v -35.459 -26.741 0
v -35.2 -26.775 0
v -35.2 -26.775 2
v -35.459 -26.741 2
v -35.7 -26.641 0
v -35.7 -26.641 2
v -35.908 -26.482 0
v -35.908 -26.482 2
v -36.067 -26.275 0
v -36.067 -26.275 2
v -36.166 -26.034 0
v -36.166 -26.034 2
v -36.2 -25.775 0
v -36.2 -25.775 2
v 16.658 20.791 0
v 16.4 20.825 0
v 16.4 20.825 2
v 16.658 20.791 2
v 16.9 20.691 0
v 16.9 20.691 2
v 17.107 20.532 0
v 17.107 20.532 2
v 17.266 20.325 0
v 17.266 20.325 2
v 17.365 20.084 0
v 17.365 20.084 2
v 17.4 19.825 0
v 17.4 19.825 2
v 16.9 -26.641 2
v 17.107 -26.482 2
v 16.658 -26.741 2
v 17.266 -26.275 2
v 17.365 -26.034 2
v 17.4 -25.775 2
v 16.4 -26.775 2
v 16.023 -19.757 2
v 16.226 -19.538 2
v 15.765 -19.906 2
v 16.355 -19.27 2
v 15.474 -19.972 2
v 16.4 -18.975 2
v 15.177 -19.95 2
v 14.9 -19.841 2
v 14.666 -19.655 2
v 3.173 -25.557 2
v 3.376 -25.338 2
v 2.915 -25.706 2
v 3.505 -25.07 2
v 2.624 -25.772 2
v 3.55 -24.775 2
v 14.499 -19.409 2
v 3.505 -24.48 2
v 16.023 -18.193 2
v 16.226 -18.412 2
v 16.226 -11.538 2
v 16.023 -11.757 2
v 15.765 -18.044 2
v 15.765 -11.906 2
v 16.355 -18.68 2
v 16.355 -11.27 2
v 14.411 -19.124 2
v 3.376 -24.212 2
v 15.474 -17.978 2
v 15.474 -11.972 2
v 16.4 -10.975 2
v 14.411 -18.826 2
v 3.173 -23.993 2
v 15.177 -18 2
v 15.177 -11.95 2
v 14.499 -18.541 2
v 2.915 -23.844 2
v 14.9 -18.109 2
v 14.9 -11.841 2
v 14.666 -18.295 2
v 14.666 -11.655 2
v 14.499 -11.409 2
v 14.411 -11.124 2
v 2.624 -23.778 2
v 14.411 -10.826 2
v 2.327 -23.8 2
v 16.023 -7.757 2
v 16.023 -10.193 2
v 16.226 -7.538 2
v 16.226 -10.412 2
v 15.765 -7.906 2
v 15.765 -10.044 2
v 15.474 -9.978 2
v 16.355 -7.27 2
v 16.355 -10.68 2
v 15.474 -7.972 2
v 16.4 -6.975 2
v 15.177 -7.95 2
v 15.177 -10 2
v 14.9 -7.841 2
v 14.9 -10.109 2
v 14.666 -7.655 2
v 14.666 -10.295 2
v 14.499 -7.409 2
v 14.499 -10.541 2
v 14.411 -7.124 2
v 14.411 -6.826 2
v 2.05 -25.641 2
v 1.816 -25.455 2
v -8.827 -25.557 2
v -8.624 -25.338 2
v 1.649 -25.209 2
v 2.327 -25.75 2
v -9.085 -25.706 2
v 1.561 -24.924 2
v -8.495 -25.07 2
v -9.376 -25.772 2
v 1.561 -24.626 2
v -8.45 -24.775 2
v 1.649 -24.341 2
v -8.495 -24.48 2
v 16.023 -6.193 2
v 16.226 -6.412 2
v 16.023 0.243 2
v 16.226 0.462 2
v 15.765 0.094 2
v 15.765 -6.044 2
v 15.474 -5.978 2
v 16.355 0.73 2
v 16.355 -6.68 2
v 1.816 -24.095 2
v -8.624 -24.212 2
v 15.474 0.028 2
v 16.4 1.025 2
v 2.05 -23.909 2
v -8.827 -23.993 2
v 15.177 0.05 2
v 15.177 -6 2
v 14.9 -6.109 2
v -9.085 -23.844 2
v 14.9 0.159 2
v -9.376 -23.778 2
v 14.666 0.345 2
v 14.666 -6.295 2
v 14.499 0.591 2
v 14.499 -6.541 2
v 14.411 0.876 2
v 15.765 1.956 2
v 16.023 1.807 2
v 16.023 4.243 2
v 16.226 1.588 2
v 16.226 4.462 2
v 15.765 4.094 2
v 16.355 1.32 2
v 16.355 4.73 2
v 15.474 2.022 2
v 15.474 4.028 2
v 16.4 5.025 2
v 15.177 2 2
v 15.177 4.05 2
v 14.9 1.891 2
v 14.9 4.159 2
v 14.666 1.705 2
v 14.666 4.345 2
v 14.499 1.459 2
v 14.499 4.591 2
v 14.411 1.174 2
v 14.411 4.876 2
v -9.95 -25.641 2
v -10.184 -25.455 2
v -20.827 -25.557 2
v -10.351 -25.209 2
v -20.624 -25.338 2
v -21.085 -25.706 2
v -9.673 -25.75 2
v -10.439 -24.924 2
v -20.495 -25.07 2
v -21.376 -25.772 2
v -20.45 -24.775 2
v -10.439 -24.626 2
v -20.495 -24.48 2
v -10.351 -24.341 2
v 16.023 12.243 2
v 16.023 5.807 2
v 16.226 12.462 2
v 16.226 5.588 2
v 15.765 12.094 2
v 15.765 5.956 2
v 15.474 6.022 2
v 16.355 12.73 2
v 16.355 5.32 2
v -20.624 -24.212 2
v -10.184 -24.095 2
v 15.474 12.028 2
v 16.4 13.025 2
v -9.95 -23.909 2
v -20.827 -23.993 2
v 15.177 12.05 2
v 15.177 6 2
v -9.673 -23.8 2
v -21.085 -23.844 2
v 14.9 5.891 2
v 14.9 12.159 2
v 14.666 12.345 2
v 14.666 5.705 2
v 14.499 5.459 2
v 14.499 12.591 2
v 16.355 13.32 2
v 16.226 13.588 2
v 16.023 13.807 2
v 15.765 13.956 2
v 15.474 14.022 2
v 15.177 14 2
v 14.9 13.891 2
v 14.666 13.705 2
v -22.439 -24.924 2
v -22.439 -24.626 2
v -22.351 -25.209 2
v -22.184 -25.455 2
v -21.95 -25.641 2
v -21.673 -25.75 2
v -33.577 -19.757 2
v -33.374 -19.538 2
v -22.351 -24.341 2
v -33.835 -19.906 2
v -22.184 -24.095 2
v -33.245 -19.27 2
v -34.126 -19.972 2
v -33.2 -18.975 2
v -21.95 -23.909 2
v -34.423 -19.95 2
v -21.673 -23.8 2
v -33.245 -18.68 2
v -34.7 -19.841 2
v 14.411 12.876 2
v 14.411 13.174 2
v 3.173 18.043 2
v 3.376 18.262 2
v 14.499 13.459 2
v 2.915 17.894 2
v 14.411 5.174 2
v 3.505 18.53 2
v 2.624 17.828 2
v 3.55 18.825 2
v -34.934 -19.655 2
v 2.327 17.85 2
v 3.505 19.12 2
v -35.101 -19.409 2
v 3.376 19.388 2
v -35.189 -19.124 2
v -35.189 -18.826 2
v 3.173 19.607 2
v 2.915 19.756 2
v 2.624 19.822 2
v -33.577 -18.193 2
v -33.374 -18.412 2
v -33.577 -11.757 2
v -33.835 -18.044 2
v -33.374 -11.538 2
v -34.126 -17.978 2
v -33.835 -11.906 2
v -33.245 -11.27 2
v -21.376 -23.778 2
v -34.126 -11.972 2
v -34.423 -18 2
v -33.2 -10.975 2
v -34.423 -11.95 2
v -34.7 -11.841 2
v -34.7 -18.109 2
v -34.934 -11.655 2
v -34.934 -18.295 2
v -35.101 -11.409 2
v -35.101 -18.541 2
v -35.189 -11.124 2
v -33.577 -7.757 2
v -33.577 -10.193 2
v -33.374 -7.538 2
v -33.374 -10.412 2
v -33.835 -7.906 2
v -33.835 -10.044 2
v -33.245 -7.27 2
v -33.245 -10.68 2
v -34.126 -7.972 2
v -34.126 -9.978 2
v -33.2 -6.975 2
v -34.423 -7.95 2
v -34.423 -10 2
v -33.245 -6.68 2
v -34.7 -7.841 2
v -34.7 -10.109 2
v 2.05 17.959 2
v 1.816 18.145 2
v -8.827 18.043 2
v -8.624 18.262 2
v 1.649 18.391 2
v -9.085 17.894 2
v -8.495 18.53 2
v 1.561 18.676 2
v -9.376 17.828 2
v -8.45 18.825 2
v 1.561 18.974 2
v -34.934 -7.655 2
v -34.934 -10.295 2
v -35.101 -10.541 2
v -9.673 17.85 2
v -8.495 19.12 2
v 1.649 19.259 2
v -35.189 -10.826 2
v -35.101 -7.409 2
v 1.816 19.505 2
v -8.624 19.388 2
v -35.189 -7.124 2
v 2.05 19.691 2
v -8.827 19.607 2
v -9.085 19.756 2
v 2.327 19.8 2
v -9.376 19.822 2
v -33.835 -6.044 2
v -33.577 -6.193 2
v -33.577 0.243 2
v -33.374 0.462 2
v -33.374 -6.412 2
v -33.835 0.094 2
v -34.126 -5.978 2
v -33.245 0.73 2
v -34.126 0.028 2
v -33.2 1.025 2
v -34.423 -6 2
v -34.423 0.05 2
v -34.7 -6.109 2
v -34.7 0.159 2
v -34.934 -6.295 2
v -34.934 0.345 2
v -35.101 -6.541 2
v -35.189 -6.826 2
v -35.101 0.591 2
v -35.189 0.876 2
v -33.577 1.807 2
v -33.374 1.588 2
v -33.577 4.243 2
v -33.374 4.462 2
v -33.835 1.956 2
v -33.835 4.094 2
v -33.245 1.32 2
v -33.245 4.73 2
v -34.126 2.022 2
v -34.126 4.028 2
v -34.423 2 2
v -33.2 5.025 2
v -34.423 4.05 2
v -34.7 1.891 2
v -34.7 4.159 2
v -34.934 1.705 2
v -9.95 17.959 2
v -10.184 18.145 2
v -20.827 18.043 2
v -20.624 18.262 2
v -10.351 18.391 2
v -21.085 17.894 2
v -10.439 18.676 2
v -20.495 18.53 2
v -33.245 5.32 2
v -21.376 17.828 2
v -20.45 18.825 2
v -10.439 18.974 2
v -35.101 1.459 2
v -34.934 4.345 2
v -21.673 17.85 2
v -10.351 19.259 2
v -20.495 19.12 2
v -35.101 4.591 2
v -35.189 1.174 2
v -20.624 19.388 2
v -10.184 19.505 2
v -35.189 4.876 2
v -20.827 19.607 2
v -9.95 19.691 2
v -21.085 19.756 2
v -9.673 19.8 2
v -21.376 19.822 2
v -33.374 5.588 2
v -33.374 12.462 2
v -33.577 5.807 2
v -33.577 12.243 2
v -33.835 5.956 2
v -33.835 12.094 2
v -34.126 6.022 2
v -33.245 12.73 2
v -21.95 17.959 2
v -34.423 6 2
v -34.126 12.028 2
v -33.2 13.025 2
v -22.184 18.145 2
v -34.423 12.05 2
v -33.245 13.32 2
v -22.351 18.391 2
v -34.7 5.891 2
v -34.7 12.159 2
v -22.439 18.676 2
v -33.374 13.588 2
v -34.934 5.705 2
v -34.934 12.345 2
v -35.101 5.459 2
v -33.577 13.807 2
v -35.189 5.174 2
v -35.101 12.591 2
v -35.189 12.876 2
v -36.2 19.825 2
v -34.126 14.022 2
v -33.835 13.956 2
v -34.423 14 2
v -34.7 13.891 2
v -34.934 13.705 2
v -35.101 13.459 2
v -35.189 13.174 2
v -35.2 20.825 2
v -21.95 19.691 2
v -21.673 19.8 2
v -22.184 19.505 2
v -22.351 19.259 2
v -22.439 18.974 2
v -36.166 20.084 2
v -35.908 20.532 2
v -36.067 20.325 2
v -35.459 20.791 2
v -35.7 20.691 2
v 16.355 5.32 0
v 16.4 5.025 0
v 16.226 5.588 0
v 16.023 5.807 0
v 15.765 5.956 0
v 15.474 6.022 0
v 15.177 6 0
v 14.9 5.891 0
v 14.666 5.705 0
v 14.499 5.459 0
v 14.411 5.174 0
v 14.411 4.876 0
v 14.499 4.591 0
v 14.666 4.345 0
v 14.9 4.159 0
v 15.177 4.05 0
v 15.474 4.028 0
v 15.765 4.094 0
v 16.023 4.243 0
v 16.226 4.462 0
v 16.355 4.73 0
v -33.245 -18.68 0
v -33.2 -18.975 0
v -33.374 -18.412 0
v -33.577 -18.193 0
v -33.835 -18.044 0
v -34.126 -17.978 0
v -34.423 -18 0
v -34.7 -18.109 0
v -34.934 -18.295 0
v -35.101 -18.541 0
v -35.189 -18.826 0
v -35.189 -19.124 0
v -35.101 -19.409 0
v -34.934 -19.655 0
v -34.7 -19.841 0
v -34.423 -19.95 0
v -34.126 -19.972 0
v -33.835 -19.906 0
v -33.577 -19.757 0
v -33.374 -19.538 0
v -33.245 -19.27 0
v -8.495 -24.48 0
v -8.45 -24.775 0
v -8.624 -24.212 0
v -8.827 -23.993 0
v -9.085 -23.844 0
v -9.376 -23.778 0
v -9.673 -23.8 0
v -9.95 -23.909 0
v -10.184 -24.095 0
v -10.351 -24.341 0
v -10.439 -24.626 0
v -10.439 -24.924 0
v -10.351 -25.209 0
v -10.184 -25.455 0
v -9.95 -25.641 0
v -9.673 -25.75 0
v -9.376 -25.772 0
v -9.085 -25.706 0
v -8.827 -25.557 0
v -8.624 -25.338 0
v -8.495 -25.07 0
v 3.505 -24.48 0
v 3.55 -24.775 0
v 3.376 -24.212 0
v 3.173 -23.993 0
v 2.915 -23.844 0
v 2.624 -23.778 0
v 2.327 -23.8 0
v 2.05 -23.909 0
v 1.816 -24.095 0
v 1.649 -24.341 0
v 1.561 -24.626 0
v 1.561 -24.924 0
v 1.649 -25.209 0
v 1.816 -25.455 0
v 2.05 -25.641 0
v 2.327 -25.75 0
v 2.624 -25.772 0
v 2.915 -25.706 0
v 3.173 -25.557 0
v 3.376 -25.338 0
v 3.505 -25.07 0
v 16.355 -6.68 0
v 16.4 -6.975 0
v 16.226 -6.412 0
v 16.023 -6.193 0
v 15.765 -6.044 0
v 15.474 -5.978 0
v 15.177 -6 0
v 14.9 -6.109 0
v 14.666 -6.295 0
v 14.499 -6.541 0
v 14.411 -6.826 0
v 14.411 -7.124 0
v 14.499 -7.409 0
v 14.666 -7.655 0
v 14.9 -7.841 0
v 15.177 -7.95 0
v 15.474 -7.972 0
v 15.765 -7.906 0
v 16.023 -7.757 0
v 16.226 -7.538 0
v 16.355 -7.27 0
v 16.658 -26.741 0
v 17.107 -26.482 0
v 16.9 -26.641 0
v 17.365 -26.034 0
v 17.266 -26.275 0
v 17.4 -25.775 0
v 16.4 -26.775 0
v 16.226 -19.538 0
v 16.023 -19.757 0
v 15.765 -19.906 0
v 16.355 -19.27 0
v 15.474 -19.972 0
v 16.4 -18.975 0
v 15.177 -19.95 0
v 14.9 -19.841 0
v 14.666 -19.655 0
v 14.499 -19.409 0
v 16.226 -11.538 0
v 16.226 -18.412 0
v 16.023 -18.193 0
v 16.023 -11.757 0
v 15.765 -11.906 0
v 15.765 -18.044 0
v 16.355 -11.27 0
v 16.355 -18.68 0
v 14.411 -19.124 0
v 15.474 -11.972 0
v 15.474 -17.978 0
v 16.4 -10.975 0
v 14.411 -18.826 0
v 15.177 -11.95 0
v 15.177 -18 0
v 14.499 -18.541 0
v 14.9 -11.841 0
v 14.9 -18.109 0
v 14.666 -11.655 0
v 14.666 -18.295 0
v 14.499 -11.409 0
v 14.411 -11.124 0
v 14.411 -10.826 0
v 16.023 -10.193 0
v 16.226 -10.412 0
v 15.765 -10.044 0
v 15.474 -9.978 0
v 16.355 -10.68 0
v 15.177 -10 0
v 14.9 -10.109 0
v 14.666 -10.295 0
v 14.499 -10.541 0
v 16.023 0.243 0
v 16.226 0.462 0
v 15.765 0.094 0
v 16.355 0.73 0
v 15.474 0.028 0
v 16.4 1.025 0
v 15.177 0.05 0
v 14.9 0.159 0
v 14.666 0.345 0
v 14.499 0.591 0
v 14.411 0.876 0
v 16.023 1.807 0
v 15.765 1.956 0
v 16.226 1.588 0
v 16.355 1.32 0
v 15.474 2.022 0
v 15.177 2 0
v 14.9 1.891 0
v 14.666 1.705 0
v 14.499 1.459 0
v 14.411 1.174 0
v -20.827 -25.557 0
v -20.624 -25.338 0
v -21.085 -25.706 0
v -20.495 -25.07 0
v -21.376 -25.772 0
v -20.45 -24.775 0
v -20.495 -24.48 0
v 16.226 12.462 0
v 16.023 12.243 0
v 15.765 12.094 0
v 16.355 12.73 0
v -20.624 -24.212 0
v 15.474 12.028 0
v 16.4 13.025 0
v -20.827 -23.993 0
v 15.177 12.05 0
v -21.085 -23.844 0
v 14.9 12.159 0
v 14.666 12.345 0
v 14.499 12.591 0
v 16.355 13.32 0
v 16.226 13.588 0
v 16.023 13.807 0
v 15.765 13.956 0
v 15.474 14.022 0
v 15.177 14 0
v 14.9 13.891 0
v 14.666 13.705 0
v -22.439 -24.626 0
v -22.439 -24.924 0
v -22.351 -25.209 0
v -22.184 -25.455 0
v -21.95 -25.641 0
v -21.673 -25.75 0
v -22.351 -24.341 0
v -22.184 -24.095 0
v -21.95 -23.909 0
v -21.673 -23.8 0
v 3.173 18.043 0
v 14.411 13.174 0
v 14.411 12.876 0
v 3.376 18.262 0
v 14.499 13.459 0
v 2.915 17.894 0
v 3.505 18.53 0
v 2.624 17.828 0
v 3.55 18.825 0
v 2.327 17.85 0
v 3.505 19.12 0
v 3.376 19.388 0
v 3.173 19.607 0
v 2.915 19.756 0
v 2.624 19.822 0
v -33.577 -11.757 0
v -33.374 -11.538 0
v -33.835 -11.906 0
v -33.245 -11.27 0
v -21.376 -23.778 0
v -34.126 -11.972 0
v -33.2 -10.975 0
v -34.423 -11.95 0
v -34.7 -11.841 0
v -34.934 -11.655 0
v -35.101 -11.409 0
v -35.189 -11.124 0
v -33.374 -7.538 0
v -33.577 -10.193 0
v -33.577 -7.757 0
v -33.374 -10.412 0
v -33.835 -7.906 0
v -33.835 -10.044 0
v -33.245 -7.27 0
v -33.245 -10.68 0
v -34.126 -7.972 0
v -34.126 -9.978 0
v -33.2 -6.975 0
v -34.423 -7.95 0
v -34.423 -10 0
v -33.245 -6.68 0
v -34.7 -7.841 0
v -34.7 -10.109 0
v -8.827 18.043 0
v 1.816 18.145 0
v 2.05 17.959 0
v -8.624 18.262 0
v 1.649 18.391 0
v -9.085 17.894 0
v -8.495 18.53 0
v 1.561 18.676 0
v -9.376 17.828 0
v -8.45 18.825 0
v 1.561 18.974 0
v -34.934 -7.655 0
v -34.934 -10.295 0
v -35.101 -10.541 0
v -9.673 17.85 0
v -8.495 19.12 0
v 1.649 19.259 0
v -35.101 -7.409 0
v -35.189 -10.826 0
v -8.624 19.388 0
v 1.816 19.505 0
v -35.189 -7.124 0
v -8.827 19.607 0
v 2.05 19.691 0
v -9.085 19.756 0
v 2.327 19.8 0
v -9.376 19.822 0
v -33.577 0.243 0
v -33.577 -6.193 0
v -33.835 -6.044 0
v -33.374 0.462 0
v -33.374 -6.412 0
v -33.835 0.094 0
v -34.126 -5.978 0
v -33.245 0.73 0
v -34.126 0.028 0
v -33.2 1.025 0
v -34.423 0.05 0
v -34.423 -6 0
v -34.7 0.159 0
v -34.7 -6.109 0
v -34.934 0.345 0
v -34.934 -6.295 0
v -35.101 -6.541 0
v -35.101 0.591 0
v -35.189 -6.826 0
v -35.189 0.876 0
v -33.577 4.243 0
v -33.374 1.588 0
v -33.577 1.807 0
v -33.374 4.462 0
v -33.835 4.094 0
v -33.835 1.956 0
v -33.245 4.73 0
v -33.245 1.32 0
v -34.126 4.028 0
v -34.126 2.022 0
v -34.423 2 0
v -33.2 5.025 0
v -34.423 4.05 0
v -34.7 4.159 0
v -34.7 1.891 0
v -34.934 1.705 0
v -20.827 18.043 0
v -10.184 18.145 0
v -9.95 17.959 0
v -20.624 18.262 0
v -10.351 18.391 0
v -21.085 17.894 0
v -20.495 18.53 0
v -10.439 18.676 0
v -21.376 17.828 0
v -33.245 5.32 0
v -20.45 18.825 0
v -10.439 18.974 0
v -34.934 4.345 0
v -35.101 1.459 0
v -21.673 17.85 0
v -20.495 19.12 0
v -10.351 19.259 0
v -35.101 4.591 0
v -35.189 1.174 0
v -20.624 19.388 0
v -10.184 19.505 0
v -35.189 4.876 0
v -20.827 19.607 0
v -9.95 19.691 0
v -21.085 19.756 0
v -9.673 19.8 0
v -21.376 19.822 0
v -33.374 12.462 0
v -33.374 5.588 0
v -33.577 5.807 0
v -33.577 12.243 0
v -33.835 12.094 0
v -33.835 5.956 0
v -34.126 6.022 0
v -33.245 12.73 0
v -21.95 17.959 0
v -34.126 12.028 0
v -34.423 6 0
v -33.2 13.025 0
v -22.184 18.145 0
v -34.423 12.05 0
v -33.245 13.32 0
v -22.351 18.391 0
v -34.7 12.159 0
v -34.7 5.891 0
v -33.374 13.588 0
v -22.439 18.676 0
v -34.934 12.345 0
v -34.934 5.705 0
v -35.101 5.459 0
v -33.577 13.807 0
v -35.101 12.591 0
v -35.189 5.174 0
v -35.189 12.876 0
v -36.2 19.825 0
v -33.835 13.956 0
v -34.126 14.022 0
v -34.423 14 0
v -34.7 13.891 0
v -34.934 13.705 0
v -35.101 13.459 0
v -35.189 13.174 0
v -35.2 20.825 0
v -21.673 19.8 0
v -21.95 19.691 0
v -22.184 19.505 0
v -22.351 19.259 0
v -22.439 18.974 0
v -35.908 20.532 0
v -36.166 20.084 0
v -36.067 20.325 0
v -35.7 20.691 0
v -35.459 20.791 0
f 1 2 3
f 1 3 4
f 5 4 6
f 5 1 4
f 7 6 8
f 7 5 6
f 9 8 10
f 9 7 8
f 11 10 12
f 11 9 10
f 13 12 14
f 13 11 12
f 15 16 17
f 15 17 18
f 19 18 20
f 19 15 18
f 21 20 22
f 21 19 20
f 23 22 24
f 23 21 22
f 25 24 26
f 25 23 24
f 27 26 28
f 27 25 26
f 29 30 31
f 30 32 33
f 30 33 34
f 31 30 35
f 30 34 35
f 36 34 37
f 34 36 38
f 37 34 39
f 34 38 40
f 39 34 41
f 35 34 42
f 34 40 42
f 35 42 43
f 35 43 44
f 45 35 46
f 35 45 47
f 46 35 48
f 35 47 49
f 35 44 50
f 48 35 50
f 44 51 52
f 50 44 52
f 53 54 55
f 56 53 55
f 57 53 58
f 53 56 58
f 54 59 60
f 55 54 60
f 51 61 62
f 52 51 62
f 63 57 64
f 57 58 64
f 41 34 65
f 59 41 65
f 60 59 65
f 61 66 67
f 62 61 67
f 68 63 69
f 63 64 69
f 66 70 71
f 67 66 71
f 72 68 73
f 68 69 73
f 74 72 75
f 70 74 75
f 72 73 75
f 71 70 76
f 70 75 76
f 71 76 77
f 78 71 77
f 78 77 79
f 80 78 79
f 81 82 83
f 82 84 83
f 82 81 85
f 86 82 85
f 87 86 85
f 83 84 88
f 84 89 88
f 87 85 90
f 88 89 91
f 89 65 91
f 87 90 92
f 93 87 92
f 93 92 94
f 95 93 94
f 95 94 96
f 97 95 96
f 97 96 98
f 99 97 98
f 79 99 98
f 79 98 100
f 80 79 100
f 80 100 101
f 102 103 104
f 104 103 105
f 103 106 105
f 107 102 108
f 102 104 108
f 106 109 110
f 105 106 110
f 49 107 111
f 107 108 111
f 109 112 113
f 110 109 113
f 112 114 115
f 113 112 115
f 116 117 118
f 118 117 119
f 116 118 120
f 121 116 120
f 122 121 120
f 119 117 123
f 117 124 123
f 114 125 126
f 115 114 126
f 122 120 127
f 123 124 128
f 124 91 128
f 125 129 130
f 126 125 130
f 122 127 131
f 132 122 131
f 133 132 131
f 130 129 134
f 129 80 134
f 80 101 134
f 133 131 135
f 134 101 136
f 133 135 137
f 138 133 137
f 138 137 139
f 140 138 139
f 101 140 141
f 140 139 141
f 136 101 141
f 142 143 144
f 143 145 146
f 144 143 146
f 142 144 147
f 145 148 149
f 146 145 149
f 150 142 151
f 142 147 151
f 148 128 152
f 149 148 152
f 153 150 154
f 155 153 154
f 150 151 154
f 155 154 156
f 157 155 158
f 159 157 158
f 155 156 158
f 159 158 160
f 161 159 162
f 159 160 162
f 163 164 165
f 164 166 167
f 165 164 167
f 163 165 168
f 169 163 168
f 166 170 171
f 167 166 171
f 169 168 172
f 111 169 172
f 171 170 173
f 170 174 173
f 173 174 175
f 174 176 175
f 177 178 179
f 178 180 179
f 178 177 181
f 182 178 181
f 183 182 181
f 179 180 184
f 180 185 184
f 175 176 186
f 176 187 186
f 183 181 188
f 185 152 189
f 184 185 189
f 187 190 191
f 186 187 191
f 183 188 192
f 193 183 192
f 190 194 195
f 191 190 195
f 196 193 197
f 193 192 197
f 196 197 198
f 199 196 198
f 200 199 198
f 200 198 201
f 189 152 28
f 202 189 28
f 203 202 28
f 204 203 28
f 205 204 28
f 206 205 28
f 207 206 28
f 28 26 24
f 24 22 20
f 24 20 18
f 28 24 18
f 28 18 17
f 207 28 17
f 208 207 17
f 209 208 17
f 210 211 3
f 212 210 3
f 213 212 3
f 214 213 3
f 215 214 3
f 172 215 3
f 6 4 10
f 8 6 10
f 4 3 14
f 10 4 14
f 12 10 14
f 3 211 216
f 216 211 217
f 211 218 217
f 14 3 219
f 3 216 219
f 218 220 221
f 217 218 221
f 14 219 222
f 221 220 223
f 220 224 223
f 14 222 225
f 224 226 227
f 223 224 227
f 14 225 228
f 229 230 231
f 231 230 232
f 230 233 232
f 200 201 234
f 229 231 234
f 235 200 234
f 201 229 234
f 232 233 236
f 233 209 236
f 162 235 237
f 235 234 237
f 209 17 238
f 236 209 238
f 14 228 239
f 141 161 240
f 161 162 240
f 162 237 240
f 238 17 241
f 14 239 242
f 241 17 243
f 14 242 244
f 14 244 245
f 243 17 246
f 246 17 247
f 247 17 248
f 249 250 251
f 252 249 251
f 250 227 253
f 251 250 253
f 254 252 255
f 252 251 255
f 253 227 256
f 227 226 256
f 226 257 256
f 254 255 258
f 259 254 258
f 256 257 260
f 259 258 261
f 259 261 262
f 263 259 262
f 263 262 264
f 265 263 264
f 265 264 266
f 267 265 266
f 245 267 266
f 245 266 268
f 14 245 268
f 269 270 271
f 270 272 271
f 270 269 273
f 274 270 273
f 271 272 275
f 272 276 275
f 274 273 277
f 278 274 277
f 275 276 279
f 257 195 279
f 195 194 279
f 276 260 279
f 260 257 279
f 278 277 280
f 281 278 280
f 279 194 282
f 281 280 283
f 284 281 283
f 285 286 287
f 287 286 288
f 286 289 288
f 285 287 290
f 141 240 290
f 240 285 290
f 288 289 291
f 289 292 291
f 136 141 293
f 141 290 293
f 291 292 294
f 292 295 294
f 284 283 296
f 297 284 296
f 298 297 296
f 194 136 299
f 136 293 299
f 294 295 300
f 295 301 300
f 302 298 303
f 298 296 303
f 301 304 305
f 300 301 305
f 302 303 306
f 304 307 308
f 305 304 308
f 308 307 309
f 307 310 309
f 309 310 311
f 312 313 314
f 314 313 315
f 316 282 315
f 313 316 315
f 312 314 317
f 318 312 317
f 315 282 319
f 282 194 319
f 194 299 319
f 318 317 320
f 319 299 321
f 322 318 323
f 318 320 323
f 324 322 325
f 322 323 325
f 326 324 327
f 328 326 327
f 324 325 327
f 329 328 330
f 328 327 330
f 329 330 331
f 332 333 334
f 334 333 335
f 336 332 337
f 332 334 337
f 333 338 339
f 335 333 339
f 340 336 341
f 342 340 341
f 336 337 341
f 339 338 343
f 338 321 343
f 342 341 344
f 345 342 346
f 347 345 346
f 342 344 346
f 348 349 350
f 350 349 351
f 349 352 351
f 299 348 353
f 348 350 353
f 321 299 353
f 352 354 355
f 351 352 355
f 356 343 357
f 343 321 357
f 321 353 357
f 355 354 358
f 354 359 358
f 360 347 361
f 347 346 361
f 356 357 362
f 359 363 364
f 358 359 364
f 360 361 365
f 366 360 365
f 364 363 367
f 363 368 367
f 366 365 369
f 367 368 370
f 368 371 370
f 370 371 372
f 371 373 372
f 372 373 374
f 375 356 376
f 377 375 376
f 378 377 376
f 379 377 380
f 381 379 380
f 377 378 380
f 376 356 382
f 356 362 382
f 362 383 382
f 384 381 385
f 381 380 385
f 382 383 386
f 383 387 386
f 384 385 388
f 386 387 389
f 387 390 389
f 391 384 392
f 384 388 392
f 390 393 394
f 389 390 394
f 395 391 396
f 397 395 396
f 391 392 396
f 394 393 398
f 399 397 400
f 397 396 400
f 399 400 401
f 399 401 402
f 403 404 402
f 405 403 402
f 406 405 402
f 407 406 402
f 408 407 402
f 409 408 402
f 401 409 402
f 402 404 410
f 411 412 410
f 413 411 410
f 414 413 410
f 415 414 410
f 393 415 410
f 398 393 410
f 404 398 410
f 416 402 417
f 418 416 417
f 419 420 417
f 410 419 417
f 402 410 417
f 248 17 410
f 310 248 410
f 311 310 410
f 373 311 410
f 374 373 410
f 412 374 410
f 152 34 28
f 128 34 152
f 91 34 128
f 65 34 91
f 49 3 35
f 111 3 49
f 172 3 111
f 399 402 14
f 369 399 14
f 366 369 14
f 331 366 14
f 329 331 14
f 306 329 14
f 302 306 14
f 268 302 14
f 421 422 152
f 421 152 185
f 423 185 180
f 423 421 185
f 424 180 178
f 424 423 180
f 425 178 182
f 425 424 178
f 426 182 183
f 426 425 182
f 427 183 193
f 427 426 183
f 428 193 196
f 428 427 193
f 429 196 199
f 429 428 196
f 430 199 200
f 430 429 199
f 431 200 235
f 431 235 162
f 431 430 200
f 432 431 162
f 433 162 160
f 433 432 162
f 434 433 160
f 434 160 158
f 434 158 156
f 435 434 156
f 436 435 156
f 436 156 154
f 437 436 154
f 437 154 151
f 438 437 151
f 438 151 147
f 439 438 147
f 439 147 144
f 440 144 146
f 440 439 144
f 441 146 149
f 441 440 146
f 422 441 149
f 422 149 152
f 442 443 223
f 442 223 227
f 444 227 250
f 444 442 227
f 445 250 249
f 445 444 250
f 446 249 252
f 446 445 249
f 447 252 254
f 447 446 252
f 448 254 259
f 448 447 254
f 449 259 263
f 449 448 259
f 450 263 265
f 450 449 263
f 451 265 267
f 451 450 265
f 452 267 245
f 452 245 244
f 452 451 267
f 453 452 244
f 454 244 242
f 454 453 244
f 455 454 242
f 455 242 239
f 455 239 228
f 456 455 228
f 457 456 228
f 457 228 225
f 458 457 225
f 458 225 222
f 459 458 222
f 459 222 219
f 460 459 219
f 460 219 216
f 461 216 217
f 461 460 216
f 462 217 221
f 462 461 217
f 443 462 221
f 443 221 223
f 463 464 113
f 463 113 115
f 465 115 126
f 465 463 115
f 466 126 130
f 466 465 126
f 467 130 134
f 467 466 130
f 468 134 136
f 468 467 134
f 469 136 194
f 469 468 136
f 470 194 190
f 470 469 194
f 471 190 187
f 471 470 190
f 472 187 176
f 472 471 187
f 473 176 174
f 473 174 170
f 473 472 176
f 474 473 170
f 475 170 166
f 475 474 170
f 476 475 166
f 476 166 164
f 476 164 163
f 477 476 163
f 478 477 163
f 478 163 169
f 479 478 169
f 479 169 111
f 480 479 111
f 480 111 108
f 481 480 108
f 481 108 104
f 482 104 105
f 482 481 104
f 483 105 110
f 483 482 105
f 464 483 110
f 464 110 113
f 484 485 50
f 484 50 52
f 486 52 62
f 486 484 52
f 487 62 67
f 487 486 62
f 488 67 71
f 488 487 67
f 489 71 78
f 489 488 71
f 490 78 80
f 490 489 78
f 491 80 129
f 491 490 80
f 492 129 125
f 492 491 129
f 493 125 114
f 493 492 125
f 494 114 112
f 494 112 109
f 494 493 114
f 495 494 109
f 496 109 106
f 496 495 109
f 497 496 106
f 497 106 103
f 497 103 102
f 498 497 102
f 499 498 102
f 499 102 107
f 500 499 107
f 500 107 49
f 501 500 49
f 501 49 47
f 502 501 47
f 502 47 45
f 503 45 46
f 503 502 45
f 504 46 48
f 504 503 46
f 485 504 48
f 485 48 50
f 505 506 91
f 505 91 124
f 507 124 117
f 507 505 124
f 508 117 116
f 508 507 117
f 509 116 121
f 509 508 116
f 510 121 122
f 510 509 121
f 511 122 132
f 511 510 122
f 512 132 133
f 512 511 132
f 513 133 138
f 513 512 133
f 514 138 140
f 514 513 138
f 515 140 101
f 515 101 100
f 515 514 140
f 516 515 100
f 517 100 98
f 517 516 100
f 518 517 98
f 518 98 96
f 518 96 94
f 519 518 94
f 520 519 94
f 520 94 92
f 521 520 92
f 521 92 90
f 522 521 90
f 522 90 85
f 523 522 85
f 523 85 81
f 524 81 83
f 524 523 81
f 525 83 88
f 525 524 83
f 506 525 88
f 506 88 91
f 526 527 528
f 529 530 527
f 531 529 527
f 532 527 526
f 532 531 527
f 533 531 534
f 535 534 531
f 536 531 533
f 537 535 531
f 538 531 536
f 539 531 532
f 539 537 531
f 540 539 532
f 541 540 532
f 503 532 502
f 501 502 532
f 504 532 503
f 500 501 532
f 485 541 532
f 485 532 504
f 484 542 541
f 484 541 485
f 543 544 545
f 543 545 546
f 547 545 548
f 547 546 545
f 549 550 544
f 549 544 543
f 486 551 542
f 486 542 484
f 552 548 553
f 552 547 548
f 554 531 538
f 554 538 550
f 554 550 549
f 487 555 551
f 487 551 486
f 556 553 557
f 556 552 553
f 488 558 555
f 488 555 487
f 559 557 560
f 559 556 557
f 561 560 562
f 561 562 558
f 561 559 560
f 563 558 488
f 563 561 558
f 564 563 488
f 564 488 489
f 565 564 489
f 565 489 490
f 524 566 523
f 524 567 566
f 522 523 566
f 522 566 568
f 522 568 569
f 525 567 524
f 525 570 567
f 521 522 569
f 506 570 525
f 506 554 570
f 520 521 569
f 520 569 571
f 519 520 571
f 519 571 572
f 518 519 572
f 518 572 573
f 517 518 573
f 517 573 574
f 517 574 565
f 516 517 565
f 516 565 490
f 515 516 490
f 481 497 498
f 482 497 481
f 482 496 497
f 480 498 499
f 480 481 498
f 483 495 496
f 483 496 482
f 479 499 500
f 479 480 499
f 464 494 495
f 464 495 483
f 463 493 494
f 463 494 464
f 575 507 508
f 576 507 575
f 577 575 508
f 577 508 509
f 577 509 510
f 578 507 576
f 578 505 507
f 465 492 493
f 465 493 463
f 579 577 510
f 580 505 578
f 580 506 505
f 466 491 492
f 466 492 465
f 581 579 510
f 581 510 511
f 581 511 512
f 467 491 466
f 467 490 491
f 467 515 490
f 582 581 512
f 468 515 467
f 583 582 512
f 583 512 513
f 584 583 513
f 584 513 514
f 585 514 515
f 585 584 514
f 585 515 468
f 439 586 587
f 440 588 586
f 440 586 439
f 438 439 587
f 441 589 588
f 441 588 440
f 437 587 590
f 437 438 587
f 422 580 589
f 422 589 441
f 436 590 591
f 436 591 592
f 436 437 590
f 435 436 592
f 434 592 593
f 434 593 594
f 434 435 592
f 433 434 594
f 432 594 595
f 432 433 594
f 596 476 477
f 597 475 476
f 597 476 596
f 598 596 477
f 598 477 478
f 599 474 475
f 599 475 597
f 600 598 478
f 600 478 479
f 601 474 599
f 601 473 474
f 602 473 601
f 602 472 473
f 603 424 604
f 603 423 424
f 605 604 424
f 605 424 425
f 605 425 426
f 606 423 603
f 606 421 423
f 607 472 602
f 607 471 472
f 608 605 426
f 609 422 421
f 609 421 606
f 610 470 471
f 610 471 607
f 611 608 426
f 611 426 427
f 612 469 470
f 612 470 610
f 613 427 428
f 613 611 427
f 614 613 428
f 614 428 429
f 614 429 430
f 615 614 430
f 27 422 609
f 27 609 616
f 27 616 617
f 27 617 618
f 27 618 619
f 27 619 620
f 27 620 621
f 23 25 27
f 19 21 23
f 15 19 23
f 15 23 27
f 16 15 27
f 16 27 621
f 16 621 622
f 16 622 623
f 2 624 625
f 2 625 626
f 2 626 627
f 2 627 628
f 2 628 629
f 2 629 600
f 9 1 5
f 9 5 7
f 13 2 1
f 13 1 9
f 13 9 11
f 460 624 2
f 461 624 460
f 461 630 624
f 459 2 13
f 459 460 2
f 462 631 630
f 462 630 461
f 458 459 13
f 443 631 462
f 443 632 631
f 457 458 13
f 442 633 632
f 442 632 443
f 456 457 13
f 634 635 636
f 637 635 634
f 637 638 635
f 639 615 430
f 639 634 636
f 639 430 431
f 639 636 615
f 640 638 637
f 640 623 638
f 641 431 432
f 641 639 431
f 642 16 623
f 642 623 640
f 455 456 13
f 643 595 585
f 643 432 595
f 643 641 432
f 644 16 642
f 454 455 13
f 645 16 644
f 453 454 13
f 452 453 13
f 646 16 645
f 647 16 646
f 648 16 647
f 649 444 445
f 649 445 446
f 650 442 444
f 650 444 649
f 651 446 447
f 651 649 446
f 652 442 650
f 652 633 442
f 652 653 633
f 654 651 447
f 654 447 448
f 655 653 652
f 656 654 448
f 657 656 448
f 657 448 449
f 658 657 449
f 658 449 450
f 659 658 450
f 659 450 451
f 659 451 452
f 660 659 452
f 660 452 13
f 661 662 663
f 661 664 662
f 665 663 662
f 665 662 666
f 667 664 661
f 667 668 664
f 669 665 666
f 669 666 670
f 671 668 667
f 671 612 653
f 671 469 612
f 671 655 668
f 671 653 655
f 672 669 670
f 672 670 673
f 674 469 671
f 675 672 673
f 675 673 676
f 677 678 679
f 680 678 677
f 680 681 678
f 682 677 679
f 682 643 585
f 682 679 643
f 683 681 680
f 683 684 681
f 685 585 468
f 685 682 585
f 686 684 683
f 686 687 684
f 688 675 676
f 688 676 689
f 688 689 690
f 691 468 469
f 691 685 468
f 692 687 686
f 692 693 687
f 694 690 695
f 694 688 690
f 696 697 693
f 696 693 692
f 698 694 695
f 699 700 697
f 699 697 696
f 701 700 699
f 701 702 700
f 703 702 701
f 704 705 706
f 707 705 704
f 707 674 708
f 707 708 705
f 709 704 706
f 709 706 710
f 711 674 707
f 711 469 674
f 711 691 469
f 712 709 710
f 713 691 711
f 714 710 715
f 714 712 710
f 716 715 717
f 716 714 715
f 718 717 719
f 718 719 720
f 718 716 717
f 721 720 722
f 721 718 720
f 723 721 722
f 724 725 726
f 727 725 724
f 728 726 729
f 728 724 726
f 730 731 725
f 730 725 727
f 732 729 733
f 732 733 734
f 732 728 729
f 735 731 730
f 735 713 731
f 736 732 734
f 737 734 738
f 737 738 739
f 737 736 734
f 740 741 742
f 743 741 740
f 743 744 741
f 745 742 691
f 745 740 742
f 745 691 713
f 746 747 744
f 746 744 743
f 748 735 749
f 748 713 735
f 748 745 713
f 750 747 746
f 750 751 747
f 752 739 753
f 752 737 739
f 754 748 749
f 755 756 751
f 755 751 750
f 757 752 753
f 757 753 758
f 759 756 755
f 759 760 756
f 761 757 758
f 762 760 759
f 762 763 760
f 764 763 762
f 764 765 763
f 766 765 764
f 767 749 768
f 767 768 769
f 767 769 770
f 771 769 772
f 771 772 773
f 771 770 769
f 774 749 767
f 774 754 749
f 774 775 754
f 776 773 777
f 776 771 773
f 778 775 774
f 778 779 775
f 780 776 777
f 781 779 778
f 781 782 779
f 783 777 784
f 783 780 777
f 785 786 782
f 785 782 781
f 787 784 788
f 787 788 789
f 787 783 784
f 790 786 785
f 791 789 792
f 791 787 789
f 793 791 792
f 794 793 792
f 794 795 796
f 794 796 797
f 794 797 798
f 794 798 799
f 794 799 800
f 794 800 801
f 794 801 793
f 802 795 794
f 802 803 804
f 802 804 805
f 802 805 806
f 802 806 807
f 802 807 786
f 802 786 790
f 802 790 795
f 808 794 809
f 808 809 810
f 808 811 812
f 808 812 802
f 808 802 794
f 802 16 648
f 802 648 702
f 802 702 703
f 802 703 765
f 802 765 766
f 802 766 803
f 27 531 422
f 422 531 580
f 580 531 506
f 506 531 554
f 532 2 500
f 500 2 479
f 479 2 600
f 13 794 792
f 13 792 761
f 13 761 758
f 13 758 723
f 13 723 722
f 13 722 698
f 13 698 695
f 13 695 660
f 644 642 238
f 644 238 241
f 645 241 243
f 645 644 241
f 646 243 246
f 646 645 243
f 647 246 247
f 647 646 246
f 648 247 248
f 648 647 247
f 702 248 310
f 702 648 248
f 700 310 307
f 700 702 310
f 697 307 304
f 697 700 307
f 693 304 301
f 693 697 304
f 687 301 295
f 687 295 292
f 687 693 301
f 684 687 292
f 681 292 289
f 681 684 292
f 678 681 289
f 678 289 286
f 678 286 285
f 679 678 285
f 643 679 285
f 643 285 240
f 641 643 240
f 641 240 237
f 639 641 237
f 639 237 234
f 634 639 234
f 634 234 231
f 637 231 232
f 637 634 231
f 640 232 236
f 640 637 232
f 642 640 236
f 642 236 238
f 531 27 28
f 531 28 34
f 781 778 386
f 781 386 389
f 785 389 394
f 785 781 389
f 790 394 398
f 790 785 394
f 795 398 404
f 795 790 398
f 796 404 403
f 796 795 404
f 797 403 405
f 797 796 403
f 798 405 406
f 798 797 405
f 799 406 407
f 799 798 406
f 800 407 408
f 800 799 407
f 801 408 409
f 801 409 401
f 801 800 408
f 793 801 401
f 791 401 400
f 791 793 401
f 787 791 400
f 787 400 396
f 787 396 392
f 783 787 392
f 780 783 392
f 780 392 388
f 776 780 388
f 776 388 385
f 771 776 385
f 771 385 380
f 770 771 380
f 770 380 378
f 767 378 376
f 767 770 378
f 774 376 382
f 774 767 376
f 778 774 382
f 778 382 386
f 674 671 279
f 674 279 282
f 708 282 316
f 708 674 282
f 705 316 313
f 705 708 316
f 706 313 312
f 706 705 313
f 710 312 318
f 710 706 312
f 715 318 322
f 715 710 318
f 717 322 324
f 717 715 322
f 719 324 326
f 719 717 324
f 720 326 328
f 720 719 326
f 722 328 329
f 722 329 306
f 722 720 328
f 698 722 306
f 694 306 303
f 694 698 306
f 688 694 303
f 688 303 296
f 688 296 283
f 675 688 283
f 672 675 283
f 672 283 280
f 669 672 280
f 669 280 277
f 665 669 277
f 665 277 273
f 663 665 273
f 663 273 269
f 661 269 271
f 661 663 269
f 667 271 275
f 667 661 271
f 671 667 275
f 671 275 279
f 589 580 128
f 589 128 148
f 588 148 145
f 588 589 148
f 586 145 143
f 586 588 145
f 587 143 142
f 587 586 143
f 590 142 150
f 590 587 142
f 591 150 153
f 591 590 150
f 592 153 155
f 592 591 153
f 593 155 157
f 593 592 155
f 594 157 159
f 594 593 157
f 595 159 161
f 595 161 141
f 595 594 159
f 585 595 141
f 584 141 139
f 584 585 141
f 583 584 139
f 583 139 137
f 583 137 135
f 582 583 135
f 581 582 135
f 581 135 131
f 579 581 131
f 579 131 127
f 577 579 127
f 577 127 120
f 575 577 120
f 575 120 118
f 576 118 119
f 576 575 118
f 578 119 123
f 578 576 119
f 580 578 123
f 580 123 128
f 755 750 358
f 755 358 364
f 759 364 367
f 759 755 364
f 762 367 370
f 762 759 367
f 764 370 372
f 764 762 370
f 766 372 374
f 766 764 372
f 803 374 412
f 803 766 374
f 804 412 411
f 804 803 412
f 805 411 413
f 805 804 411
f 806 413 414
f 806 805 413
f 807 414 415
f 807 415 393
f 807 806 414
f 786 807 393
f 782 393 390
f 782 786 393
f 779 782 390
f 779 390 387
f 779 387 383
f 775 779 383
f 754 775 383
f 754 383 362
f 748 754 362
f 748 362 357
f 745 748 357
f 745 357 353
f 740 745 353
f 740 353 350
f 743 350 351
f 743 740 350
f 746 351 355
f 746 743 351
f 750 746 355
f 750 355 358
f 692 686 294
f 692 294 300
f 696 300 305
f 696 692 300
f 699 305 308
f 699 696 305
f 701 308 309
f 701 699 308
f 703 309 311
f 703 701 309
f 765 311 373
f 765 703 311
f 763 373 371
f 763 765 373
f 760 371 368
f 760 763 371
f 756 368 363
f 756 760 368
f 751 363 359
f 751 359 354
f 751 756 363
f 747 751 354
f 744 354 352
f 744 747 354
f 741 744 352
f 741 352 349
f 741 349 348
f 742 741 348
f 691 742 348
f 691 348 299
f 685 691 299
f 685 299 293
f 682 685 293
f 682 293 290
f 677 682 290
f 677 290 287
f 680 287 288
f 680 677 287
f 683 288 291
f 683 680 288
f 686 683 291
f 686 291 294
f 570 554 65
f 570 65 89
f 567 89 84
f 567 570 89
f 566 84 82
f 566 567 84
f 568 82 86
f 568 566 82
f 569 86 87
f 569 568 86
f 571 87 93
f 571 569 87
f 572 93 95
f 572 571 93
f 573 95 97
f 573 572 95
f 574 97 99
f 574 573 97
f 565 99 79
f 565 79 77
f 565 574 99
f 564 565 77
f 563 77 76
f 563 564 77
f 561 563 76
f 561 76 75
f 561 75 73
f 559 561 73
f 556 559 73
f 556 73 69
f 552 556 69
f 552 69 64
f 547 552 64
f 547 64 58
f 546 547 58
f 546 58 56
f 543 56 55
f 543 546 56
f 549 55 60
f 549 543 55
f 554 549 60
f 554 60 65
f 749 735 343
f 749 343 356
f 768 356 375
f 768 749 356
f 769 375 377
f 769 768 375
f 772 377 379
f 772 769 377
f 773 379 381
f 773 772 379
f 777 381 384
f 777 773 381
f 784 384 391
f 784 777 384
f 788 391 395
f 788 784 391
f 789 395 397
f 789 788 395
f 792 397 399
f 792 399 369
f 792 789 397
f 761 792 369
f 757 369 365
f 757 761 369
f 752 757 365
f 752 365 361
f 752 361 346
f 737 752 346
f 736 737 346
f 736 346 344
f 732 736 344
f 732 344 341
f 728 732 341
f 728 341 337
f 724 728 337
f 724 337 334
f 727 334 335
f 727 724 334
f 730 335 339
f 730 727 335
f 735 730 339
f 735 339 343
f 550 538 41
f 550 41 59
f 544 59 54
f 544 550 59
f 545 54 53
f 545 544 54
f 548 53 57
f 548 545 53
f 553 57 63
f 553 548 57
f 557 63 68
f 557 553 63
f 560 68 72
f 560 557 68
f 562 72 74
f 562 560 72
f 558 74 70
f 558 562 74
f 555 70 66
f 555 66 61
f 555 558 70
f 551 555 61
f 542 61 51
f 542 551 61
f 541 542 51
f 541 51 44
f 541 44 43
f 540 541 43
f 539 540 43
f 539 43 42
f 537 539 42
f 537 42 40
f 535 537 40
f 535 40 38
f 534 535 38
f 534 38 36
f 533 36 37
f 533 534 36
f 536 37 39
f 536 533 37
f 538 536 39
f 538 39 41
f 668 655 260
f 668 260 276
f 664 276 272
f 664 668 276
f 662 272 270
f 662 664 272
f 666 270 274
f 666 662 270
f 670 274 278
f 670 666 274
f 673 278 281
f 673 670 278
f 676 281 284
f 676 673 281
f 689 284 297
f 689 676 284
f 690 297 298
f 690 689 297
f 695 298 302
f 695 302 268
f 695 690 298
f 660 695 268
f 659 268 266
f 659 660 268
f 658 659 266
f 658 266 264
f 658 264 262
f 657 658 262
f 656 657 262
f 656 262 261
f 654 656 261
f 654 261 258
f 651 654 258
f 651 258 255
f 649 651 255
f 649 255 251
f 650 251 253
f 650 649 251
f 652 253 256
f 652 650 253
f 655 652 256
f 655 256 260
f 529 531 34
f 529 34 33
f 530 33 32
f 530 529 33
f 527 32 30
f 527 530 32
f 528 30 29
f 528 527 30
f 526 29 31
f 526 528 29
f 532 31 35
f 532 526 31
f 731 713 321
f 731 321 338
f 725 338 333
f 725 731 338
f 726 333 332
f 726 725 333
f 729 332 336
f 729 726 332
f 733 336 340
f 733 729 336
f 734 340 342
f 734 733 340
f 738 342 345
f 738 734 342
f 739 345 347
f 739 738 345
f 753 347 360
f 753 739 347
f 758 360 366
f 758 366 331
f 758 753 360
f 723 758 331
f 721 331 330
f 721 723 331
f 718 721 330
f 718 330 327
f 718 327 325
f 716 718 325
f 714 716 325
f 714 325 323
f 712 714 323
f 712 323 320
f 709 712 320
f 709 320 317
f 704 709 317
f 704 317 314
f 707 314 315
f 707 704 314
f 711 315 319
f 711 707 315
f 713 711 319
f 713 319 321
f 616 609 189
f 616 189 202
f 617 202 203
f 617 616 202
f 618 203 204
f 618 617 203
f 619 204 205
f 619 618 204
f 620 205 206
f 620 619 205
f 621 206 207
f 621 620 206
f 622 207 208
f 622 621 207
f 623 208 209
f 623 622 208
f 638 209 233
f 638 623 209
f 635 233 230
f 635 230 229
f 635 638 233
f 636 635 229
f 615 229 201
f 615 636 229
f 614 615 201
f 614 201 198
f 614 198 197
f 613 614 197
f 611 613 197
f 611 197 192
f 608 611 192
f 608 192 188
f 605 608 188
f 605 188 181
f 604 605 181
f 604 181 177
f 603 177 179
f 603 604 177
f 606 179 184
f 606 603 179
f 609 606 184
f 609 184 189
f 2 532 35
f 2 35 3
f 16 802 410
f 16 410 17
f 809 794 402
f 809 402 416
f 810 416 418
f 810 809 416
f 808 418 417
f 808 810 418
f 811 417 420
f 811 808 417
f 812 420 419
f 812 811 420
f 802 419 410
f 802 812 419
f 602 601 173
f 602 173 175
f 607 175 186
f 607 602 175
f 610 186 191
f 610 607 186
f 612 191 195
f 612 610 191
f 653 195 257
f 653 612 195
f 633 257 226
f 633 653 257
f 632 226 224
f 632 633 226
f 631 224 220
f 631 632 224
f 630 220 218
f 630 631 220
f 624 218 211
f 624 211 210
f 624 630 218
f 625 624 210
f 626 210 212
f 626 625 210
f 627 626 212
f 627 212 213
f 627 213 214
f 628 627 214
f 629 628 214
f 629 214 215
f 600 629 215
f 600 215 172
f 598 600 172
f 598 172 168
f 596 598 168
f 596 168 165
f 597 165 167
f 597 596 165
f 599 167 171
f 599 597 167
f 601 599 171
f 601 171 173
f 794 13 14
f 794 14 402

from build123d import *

# Parameters (mm, degrees)
SKETCH_1_R      = 1
EXTRUDE_1_DEPTH = 2


with BuildPart() as part:
    # 草圖1 → 填料-伸長1 (new body)
    with BuildSketch(Plane.XY):
        with BuildLine():
            Line((-35.200489897, 20.825), (16.399510103, 20.825))
            ThreePointArc((16.399510103, 20.825), (17.106616884, 20.532106781), (17.399510103, 19.825))
            Line((17.399510103, 19.825), (17.399510103, -25.775))
            ThreePointArc((17.399510103, -25.775), (17.106616884, -26.482106781), (16.399510103, -26.775))
            Line((16.399510103, -26.775), (-35.200489897, -26.775))
            ThreePointArc((-35.200489897, -26.775), (-35.907596678, -26.482106781), (-36.200489897, -25.775))
            Line((-36.200489897, -25.775), (-36.200489897, 19.825))
            ThreePointArc((-36.200489897, 19.825), (-35.907596678, 20.532106781), (-35.200489897, 20.825))
        make_face()
        with Locations((-9.450489897, 18.825)):
            Circle(SKETCH_1_R, mode=Mode.SUBTRACT)
        with Locations((-9.450489897, -24.775)):
            Circle(SKETCH_1_R, mode=Mode.SUBTRACT)
        with Locations((15.399510103, 1.025)):
            Circle(SKETCH_1_R, mode=Mode.SUBTRACT)
        with Locations((-34.200489897, 1.025)):
            Circle(SKETCH_1_R, mode=Mode.SUBTRACT)
        with Locations((-34.200489897, -6.975)):
            Circle(SKETCH_1_R, mode=Mode.SUBTRACT)
        with Locations((15.399510103, -6.975)):
            Circle(SKETCH_1_R, mode=Mode.SUBTRACT)
        with Locations((-34.200489897, 13.025)):
            Circle(SKETCH_1_R, mode=Mode.SUBTRACT)
        with Locations((-34.200489897, 5.025)):
            Circle(SKETCH_1_R, mode=Mode.SUBTRACT)
        with Locations((-34.200489897, -10.975)):
            Circle(SKETCH_1_R, mode=Mode.SUBTRACT)
        with Locations((-34.200489897, -18.975)):
            Circle(SKETCH_1_R, mode=Mode.SUBTRACT)
        with Locations((15.399510103, 13.025)):
            Circle(SKETCH_1_R, mode=Mode.SUBTRACT)
        with Locations((15.399510103, 5.025)):
            Circle(SKETCH_1_R, mode=Mode.SUBTRACT)
        with Locations((15.399510103, -10.975)):
            Circle(SKETCH_1_R, mode=Mode.SUBTRACT)
        with Locations((15.399510103, -18.975)):
            Circle(SKETCH_1_R, mode=Mode.SUBTRACT)
        with Locations((-21.450489897, 18.825)):
            Circle(SKETCH_1_R, mode=Mode.SUBTRACT)
        with Locations((2.549510103, 18.825)):
            Circle(SKETCH_1_R, mode=Mode.SUBTRACT)
        with Locations((-21.450489897, -24.775)):
            Circle(SKETCH_1_R, mode=Mode.SUBTRACT)
        with Locations((2.549510103, -24.775)):
            Circle(SKETCH_1_R, mode=Mode.SUBTRACT)
    extrude(amount=EXTRUDE_1_DEPTH)


solid = part.part
